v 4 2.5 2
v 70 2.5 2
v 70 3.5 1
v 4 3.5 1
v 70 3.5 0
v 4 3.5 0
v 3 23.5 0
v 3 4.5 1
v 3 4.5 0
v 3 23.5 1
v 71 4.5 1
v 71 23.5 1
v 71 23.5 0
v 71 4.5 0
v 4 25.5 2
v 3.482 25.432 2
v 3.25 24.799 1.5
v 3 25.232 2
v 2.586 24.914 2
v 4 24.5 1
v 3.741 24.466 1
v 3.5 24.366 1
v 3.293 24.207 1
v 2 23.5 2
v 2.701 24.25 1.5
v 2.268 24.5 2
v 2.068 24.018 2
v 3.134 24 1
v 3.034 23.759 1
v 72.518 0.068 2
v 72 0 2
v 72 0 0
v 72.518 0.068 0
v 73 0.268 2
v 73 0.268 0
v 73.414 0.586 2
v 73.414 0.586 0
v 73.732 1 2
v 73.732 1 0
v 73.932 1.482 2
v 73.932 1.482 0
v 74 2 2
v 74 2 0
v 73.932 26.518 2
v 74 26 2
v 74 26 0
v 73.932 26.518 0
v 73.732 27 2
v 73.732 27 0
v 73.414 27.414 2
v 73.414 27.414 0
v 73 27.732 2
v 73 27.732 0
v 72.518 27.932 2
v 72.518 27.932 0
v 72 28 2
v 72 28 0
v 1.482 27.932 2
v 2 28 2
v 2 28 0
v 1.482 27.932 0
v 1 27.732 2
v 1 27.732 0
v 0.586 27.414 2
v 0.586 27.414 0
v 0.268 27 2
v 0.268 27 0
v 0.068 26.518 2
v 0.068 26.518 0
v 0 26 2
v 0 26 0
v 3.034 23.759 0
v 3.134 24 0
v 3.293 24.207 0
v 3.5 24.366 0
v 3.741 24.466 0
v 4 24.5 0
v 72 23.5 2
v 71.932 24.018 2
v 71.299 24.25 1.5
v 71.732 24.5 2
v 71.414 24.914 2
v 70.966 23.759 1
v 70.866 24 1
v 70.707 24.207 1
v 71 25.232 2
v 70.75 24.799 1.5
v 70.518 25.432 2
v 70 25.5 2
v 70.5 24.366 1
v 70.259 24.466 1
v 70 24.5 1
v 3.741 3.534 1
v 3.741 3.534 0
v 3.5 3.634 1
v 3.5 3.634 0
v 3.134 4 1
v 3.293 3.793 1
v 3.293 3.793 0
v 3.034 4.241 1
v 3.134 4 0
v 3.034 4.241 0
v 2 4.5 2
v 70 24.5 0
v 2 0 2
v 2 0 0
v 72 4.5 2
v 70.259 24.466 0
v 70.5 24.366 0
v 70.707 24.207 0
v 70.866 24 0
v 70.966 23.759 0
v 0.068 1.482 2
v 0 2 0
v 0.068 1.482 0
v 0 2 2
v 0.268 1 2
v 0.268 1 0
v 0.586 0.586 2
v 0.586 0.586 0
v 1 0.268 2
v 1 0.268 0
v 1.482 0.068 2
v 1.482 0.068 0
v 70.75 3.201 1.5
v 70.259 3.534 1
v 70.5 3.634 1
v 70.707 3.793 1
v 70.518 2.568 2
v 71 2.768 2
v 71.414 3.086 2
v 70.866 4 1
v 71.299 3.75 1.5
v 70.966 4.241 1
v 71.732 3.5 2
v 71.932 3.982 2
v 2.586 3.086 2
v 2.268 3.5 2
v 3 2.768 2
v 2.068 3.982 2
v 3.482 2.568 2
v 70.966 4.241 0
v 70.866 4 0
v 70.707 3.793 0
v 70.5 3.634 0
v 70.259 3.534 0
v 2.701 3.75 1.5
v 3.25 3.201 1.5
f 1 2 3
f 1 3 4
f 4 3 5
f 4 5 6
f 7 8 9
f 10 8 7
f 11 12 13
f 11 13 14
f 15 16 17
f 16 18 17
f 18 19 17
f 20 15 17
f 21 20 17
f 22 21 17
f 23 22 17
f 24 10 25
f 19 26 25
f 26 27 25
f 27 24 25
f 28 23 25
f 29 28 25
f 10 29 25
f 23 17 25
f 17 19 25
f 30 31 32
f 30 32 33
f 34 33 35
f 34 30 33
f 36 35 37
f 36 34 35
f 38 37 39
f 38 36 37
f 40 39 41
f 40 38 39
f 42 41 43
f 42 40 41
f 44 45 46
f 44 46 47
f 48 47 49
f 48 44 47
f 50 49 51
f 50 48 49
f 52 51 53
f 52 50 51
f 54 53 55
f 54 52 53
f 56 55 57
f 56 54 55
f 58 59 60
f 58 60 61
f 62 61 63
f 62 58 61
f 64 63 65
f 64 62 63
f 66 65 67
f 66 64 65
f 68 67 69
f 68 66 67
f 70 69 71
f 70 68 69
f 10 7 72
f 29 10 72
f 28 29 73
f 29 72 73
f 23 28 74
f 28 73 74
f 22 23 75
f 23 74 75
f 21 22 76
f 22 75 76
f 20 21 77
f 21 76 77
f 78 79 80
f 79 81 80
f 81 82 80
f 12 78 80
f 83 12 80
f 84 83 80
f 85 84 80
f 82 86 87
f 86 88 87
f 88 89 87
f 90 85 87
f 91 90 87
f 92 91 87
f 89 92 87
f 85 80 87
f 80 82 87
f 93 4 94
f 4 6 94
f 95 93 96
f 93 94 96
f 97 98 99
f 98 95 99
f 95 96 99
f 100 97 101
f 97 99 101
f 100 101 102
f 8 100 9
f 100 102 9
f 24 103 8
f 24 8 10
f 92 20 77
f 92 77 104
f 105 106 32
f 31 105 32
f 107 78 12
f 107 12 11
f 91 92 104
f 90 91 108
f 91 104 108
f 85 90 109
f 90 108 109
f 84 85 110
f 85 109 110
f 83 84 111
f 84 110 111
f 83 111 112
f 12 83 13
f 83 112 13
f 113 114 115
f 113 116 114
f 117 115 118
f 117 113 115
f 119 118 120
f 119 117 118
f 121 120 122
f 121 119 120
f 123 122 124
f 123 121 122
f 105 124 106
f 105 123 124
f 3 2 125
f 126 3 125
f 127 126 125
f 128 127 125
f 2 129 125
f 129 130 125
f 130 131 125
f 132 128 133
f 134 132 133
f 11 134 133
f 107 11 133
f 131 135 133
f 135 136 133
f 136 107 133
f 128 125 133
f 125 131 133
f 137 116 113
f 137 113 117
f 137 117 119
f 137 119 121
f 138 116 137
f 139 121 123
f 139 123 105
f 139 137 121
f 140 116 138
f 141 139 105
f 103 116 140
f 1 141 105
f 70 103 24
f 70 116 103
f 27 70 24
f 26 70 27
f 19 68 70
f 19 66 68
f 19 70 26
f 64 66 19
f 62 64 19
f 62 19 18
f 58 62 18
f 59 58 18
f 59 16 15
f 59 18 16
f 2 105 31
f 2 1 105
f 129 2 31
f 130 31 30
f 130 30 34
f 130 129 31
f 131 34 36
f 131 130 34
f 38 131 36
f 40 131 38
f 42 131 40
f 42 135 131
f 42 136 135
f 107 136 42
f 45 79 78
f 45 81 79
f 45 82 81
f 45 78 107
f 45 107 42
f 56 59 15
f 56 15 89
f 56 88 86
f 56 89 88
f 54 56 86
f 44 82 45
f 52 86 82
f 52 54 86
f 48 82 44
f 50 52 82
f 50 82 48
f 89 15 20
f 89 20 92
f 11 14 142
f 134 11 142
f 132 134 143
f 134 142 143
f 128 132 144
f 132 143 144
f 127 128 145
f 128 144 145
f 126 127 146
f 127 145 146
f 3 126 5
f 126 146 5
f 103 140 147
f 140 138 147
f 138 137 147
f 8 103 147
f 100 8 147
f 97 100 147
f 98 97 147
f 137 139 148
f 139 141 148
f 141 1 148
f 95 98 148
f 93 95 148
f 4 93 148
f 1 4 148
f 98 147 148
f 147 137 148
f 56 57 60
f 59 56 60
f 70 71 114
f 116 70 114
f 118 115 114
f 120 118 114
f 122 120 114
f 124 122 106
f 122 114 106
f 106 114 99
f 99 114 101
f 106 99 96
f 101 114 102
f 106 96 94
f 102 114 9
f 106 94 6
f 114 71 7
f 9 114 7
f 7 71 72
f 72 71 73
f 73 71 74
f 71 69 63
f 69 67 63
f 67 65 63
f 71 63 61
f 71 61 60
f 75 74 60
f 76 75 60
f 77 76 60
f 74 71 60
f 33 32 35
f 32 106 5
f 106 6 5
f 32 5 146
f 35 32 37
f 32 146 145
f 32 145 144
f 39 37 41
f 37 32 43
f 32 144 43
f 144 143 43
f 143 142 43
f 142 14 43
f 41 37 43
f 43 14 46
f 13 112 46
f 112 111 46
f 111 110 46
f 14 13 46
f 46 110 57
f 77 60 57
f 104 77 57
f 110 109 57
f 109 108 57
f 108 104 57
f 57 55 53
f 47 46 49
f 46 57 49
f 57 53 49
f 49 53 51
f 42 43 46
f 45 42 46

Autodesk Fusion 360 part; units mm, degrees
sketch "Sketch1" plane through (0, 0, 0) normal (0, 0, 1) x (1, 0, 0)
  line L0 (0, 0) -> (74, 0)
  line L1 (74, 0) -> (74, 28)
  line L2 (74, 28) -> (0, 28)
  line L3 (0, 28) -> (0, 0)
  dimension "d1" = 74
  dimension "d2" = 28
extrude "Extrude1" add sketch "Sketch1" along normal blind 2
sketch "Sketch2" plane through (0, 0, 2) normal (0, 0, 1) x (-1, 0, 0)
  line L0 (0, -28) -> (0, 0)
  line L1 (0, 0) -> (-74, 0)
  line L2 (-74, 0) -> (-74, -28)
  line L3 (-74, -28) -> (0, -28)
  line L4 (-3, -24.5) -> (-71, -24.5)
  line L5 (-71, -24.5) -> (-71, -3.5)
  line L6 (-71, -3.5) -> (-3, -3.5)
  line L7 (-3, -3.5) -> (-3, -24.5)
  dimension "d5" = 3.5
  dimension "d6" = 3
  dimension "d7" = 3.5
  dimension "d8" = 3
extrude "Extrude2" cut sketch "Sketch2" against normal blind 2 contours L4 L5 L6 L7
fillet "Fillet1" radius 2 4 edges at (74, 0, 1) (74, 28, 1) (0, 28, 1) (0, 0, 1)
fillet "Fillet2" radius 1 4 edges at (71, 24.5, 1) (3, 24.5, 1) (3, 3.5, 1) (71, 3.5, 1)
chamfer "Chamfer1" distance 1 angle 45 8 edges at (3.2929, 3.7929, 2) (3, 14, 2) (3.2929, 24.2071, 2) (37, 24.5, 2) (70.7071, 24.2071, 2) (71, 14, 2) (70.7071, 3.7929, 2) (37, 3.5, 2)
